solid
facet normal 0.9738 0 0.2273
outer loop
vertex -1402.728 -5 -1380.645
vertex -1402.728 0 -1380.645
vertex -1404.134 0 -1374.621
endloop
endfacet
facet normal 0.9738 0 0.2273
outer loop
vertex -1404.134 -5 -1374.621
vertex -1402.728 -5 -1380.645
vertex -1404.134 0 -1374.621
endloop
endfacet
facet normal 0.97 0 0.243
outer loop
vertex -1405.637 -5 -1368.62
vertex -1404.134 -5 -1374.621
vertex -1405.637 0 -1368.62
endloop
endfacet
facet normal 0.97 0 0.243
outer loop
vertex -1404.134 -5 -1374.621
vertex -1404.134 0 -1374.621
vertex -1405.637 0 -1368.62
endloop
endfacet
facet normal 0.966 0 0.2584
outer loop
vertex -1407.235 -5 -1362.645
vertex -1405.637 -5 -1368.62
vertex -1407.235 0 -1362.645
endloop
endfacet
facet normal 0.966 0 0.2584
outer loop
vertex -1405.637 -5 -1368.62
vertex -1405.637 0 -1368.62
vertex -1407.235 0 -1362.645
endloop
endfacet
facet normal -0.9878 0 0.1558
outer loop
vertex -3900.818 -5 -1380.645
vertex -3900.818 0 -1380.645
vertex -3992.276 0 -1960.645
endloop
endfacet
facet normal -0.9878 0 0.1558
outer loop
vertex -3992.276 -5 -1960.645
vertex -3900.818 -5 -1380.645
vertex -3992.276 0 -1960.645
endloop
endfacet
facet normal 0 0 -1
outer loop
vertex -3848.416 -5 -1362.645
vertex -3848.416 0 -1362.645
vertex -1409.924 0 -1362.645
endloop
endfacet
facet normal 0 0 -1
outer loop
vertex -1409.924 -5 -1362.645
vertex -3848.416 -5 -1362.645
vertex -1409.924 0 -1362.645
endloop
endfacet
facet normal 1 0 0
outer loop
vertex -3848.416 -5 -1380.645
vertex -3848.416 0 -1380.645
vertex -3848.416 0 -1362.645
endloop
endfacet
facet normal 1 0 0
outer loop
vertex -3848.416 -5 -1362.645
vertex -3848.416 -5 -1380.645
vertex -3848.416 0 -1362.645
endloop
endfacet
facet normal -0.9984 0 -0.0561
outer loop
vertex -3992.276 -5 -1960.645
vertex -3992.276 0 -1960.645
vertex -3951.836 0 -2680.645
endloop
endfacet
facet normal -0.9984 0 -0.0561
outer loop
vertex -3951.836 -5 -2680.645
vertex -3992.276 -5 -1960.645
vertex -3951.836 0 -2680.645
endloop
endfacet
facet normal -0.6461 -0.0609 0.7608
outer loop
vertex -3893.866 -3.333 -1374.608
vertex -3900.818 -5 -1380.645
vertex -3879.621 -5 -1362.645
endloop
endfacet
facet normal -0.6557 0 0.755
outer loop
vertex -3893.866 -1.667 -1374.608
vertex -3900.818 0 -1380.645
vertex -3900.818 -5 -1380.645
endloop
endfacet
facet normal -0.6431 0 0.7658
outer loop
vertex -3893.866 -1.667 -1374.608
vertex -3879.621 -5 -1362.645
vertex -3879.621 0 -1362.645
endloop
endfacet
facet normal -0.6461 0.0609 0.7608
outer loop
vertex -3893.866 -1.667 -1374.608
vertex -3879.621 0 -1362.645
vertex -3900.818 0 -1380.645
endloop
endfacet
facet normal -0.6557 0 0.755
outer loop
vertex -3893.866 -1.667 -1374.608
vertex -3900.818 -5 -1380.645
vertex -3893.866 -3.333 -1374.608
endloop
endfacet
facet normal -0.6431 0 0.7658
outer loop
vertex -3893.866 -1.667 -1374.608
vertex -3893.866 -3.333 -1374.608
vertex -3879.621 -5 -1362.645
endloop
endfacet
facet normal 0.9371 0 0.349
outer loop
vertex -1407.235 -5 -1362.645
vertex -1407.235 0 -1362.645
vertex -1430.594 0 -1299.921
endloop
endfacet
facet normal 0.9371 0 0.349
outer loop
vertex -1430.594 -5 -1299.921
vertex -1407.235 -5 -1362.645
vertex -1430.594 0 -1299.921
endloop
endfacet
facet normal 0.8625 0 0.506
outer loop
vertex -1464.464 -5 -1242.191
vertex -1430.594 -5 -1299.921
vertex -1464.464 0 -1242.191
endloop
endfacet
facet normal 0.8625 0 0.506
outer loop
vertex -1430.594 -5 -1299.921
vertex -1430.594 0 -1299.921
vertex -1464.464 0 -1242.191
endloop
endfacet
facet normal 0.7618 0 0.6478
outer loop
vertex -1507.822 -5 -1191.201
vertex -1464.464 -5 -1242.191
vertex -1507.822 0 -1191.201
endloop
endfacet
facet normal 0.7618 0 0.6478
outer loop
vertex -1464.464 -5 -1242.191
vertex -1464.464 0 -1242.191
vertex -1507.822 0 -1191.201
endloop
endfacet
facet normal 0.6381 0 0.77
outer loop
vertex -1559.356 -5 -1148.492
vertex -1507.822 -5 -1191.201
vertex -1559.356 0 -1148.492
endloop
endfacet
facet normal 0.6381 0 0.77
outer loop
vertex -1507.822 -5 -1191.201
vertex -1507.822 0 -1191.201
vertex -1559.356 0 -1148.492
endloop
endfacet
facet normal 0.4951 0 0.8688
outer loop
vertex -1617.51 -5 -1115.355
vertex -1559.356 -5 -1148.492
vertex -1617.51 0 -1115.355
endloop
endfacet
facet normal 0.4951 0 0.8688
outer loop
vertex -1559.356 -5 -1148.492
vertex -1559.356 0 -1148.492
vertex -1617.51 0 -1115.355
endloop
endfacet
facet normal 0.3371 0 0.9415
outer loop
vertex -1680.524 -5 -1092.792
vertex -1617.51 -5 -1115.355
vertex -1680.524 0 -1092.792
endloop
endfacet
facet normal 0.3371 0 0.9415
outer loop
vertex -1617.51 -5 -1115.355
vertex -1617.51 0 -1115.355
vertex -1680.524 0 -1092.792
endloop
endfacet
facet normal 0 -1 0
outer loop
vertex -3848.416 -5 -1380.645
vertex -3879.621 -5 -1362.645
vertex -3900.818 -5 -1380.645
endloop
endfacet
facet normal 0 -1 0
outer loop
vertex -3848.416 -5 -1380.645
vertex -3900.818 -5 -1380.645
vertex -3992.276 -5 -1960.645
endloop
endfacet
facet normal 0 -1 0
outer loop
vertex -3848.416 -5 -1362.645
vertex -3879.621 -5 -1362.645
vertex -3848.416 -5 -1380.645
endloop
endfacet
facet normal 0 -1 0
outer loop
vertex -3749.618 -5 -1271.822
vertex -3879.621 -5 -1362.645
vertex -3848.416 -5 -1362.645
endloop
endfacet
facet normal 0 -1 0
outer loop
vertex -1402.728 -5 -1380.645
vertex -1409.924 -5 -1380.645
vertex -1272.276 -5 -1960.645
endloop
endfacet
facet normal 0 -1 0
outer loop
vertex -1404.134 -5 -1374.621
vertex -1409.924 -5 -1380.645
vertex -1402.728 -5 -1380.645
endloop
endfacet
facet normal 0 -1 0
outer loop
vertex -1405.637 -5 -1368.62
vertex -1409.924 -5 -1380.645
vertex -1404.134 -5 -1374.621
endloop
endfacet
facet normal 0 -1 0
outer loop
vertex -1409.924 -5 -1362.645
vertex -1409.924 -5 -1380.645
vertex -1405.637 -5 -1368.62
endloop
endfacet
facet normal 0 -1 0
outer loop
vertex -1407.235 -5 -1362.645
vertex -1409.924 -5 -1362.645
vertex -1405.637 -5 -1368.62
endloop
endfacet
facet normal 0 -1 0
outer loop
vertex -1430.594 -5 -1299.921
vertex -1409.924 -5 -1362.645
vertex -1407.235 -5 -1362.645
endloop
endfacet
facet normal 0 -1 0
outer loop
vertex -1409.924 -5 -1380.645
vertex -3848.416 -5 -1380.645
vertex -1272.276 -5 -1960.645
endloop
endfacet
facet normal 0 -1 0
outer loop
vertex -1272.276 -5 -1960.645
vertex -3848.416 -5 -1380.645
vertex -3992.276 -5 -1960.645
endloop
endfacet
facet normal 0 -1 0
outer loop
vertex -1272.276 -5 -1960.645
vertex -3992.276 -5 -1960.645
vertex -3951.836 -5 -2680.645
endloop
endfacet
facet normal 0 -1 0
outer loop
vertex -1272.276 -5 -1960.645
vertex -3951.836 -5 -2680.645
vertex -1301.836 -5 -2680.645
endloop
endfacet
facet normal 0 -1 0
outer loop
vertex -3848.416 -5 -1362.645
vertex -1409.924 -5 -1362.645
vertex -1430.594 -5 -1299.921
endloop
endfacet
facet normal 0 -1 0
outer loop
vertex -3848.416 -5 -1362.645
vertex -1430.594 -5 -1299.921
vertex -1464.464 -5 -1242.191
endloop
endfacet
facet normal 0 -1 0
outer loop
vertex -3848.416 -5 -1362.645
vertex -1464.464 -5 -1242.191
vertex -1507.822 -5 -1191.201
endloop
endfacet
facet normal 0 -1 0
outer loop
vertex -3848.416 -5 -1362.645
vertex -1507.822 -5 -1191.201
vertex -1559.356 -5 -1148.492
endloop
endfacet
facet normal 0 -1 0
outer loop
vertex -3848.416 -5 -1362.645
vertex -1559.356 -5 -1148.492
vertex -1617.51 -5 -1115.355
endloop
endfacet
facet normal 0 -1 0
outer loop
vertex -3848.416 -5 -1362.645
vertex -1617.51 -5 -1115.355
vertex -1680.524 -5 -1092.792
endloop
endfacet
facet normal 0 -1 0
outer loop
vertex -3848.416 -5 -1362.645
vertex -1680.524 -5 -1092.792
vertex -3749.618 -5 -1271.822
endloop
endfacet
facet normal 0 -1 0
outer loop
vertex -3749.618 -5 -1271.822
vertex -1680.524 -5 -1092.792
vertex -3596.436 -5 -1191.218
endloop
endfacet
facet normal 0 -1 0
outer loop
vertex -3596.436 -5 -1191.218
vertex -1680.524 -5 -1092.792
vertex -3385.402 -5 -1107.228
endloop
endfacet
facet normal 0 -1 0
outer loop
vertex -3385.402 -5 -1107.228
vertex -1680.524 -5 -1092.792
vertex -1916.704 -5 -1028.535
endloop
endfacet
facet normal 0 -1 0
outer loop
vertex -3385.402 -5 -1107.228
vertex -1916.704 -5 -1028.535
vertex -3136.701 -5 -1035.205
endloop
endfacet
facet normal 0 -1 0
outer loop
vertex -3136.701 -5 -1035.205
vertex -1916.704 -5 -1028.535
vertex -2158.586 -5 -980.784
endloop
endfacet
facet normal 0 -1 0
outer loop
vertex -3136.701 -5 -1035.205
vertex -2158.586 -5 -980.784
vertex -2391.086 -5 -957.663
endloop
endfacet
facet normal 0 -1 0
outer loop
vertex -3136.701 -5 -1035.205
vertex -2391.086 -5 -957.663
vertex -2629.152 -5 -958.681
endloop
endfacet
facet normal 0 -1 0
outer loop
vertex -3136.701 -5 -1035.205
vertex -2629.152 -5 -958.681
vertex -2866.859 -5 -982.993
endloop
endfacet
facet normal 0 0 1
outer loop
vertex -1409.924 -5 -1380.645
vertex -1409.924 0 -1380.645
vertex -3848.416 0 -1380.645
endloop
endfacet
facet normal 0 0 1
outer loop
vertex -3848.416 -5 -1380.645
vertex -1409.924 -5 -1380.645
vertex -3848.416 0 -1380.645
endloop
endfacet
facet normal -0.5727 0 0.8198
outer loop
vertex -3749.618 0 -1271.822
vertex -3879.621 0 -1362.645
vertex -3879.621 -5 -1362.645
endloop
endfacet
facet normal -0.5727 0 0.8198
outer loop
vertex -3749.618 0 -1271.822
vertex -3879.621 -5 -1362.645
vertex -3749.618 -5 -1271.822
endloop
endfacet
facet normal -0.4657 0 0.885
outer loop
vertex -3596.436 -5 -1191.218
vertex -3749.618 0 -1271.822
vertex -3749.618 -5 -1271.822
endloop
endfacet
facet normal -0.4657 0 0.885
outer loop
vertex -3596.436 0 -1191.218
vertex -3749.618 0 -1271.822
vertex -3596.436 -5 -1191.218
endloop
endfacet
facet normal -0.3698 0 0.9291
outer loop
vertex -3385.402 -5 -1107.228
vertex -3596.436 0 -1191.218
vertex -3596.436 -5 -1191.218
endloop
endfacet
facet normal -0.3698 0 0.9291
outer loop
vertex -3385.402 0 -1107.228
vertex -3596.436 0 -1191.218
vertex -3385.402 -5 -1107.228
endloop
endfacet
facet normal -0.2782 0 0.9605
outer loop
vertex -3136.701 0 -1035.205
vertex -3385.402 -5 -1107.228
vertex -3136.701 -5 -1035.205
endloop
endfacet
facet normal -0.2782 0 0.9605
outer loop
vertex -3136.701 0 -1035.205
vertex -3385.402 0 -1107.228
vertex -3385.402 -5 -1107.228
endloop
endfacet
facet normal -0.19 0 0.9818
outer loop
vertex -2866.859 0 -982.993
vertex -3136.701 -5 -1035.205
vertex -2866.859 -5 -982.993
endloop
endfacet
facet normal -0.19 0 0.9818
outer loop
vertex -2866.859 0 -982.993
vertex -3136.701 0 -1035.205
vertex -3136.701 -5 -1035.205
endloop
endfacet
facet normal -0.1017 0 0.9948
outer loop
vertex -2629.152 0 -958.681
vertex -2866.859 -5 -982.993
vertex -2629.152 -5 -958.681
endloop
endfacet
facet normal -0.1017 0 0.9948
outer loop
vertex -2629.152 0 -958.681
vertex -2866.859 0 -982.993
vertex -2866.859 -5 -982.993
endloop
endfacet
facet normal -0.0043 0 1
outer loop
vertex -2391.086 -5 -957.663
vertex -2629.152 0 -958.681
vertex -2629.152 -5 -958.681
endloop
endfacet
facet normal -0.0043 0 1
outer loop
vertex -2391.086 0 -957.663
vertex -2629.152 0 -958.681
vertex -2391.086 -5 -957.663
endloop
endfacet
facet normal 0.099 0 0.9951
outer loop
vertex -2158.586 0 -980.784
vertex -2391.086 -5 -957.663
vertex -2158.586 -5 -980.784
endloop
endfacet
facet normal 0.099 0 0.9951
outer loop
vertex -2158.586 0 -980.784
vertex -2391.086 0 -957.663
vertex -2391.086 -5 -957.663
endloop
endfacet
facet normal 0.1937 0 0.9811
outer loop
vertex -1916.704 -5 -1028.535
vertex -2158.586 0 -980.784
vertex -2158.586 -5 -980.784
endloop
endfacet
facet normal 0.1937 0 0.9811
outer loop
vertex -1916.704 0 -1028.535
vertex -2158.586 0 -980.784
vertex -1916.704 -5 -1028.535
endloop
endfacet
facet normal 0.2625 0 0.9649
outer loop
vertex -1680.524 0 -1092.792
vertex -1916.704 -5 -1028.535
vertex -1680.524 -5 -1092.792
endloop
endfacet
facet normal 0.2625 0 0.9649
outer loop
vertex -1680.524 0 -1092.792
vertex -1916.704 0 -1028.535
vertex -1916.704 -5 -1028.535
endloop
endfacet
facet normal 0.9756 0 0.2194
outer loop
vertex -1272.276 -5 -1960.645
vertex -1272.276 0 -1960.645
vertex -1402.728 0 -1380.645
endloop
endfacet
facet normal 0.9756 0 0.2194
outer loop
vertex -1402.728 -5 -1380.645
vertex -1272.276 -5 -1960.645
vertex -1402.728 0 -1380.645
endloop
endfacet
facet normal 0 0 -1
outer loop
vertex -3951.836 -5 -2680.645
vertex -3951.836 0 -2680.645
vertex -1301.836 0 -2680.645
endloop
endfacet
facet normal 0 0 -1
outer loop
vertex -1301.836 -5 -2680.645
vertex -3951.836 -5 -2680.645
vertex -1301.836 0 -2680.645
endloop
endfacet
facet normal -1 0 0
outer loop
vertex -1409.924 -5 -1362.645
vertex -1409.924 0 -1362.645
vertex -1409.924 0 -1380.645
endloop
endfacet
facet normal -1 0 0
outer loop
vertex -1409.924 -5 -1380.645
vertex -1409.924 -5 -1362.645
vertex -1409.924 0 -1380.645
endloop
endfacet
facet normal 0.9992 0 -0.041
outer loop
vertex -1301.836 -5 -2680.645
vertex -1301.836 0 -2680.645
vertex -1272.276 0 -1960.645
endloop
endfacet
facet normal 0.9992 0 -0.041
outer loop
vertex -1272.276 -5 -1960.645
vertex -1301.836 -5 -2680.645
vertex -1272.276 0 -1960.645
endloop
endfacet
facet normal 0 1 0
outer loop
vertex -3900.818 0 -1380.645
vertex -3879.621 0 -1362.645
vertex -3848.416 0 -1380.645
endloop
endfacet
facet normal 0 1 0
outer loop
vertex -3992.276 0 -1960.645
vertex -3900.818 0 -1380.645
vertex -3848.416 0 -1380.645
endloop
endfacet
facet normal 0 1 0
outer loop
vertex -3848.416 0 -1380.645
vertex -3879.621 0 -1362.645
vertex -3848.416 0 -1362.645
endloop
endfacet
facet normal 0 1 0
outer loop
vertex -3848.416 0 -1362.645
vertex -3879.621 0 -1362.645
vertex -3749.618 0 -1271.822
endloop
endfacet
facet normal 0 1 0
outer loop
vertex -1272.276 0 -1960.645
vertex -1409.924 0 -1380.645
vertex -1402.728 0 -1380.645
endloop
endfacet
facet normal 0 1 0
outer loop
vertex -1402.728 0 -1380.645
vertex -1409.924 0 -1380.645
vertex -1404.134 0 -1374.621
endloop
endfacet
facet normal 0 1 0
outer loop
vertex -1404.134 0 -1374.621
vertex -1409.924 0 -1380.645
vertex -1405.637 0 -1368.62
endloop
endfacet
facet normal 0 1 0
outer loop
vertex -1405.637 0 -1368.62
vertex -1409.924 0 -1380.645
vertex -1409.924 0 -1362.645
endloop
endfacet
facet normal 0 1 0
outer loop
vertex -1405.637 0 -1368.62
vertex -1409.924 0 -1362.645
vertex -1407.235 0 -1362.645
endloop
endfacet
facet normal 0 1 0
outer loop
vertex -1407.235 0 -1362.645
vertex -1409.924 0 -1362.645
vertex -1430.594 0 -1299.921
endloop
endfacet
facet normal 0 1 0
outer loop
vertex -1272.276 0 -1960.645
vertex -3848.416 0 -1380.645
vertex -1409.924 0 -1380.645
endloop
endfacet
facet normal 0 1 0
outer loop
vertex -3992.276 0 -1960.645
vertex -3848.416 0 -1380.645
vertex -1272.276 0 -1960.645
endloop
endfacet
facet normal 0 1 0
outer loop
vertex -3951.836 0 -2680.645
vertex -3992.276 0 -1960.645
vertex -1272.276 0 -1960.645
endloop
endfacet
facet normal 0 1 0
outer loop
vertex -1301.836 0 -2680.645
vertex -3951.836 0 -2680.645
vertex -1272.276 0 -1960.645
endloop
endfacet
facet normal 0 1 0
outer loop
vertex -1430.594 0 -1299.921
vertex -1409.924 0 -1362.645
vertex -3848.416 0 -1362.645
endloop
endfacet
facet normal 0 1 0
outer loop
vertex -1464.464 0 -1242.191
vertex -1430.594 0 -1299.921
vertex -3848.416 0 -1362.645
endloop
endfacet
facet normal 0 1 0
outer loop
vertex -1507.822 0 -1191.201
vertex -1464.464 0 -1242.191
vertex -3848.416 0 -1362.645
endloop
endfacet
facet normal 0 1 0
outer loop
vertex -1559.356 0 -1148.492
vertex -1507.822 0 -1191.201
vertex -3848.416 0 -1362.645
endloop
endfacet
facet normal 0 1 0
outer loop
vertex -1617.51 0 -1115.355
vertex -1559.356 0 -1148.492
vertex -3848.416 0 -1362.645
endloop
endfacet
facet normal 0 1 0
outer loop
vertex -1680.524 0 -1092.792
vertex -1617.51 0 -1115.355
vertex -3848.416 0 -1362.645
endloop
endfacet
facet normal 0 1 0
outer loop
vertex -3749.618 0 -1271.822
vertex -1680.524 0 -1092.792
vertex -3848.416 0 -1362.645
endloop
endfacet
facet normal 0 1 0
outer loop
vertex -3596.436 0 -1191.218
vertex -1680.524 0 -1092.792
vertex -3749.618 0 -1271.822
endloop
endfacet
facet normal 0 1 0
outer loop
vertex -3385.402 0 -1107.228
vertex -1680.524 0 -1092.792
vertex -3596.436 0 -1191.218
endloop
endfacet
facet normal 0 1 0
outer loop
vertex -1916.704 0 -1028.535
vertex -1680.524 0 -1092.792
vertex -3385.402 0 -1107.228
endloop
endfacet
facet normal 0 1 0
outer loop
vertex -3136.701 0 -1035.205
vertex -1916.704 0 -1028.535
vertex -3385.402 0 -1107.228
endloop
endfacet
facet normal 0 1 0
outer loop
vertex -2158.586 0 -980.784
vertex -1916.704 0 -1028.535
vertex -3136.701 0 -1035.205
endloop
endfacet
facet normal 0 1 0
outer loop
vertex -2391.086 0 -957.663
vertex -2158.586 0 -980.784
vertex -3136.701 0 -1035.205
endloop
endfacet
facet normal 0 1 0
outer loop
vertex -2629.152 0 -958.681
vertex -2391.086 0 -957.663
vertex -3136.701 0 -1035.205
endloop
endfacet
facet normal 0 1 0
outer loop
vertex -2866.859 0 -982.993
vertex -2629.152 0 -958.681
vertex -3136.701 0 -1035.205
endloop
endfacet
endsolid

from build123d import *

# Parameters (mm, degrees)
F1_DEPTH = 5


with BuildPart() as f1:
    # F0 (on Front) → F1 (new body)
    with BuildSketch(Plane.XZ):
        Polygon((-1751.8359871062, -2680.6445531845), (-1301.8359871062, -2680.6445531845), (-1272.2757193561, -1960.6445531845), (-3992.2757193561, -1960.6445531845), (-3951.8359871062, -2680.6445531845), (-2351.8359871062, -2680.6445531845), align=None)
        Polygon((-3992.2757193561, -1960.6445531845), (-1272.2757193561, -1960.6445531845), (-1402.7283334229, -1380.6445531845), (-1409.9237918854, -1380.6445531845), (-3848.4160900116, -1380.6445531845), (-3900.8176115902, -1380.6445531845), align=None)
        with BuildLine():
            Line((-1409.9237918854, -1380.6445531845), (-1402.7283334229, -1380.6445531845))
            ThreePointArc((-1402.7283334229, -1380.6445531845), (-1404.8733221137, -1371.617393178), (-1407.2352570657, -1362.6445531845))
            Line((-1407.2352570657, -1362.6445531845), (-1409.9237918854, -1362.6445531845))
            Line((-1409.9237918854, -1362.6445531845), (-1409.9237918854, -1380.6445531845))
        make_face()
        with BuildLine():
            add(Edge.make_bspline(
                [(-3900.8176115902, -1380.6445531845), (-3893.9229894345, -1374.5892924852), (-3886.8552522948, -1368.589080147), (-3879.620532999, -1362.6445531845)],
                knots=[0, 0, 0, 0, 0.0136413851, 0.0136413851, 0.0136413851, 0.0136413851], degree=3))
            Line((-3900.8176115902, -1380.6445531845), (-3848.4160900116, -1380.6445531845))
            Line((-3848.4160900116, -1380.6445531845), (-3848.4160900116, -1362.6445531845))
            Line((-3848.4160900116, -1362.6445531845), (-3879.620532999, -1362.6445531845))
        make_face()
        with BuildLine():
            Line((-1409.9237918854, -1362.6445531845), (-1407.2352570657, -1362.6445531845))
            ThreePointArc((-1407.2352570657, -1362.6445531845), (-1507.8215805234, -1191.2011417655), (-1680.5239915848, -1092.7921533585))
            add(Edge.make_bspline(
                [(-3879.620532999, -1362.6445531845), (-3603.12312988, -1135.4558813494), (-2618.5664613174, -859.5105731667), (-1986.4067119692, -1001.9832394606), (-1680.5239915848, -1092.7921533585)],
                knots=[0.0136413851, 0.0136413851, 0.0136413851, 0.0136413851, 0.5349895413, 1, 1, 1, 1], degree=3))
            Line((-3879.620532999, -1362.6445531845), (-3848.4160900116, -1362.6445531845))
            Line((-3848.4160900116, -1362.6445531845), (-1409.9237918854, -1362.6445531845))
        make_face()
    extrude(amount=F1_DEPTH)


solid = f1.part
